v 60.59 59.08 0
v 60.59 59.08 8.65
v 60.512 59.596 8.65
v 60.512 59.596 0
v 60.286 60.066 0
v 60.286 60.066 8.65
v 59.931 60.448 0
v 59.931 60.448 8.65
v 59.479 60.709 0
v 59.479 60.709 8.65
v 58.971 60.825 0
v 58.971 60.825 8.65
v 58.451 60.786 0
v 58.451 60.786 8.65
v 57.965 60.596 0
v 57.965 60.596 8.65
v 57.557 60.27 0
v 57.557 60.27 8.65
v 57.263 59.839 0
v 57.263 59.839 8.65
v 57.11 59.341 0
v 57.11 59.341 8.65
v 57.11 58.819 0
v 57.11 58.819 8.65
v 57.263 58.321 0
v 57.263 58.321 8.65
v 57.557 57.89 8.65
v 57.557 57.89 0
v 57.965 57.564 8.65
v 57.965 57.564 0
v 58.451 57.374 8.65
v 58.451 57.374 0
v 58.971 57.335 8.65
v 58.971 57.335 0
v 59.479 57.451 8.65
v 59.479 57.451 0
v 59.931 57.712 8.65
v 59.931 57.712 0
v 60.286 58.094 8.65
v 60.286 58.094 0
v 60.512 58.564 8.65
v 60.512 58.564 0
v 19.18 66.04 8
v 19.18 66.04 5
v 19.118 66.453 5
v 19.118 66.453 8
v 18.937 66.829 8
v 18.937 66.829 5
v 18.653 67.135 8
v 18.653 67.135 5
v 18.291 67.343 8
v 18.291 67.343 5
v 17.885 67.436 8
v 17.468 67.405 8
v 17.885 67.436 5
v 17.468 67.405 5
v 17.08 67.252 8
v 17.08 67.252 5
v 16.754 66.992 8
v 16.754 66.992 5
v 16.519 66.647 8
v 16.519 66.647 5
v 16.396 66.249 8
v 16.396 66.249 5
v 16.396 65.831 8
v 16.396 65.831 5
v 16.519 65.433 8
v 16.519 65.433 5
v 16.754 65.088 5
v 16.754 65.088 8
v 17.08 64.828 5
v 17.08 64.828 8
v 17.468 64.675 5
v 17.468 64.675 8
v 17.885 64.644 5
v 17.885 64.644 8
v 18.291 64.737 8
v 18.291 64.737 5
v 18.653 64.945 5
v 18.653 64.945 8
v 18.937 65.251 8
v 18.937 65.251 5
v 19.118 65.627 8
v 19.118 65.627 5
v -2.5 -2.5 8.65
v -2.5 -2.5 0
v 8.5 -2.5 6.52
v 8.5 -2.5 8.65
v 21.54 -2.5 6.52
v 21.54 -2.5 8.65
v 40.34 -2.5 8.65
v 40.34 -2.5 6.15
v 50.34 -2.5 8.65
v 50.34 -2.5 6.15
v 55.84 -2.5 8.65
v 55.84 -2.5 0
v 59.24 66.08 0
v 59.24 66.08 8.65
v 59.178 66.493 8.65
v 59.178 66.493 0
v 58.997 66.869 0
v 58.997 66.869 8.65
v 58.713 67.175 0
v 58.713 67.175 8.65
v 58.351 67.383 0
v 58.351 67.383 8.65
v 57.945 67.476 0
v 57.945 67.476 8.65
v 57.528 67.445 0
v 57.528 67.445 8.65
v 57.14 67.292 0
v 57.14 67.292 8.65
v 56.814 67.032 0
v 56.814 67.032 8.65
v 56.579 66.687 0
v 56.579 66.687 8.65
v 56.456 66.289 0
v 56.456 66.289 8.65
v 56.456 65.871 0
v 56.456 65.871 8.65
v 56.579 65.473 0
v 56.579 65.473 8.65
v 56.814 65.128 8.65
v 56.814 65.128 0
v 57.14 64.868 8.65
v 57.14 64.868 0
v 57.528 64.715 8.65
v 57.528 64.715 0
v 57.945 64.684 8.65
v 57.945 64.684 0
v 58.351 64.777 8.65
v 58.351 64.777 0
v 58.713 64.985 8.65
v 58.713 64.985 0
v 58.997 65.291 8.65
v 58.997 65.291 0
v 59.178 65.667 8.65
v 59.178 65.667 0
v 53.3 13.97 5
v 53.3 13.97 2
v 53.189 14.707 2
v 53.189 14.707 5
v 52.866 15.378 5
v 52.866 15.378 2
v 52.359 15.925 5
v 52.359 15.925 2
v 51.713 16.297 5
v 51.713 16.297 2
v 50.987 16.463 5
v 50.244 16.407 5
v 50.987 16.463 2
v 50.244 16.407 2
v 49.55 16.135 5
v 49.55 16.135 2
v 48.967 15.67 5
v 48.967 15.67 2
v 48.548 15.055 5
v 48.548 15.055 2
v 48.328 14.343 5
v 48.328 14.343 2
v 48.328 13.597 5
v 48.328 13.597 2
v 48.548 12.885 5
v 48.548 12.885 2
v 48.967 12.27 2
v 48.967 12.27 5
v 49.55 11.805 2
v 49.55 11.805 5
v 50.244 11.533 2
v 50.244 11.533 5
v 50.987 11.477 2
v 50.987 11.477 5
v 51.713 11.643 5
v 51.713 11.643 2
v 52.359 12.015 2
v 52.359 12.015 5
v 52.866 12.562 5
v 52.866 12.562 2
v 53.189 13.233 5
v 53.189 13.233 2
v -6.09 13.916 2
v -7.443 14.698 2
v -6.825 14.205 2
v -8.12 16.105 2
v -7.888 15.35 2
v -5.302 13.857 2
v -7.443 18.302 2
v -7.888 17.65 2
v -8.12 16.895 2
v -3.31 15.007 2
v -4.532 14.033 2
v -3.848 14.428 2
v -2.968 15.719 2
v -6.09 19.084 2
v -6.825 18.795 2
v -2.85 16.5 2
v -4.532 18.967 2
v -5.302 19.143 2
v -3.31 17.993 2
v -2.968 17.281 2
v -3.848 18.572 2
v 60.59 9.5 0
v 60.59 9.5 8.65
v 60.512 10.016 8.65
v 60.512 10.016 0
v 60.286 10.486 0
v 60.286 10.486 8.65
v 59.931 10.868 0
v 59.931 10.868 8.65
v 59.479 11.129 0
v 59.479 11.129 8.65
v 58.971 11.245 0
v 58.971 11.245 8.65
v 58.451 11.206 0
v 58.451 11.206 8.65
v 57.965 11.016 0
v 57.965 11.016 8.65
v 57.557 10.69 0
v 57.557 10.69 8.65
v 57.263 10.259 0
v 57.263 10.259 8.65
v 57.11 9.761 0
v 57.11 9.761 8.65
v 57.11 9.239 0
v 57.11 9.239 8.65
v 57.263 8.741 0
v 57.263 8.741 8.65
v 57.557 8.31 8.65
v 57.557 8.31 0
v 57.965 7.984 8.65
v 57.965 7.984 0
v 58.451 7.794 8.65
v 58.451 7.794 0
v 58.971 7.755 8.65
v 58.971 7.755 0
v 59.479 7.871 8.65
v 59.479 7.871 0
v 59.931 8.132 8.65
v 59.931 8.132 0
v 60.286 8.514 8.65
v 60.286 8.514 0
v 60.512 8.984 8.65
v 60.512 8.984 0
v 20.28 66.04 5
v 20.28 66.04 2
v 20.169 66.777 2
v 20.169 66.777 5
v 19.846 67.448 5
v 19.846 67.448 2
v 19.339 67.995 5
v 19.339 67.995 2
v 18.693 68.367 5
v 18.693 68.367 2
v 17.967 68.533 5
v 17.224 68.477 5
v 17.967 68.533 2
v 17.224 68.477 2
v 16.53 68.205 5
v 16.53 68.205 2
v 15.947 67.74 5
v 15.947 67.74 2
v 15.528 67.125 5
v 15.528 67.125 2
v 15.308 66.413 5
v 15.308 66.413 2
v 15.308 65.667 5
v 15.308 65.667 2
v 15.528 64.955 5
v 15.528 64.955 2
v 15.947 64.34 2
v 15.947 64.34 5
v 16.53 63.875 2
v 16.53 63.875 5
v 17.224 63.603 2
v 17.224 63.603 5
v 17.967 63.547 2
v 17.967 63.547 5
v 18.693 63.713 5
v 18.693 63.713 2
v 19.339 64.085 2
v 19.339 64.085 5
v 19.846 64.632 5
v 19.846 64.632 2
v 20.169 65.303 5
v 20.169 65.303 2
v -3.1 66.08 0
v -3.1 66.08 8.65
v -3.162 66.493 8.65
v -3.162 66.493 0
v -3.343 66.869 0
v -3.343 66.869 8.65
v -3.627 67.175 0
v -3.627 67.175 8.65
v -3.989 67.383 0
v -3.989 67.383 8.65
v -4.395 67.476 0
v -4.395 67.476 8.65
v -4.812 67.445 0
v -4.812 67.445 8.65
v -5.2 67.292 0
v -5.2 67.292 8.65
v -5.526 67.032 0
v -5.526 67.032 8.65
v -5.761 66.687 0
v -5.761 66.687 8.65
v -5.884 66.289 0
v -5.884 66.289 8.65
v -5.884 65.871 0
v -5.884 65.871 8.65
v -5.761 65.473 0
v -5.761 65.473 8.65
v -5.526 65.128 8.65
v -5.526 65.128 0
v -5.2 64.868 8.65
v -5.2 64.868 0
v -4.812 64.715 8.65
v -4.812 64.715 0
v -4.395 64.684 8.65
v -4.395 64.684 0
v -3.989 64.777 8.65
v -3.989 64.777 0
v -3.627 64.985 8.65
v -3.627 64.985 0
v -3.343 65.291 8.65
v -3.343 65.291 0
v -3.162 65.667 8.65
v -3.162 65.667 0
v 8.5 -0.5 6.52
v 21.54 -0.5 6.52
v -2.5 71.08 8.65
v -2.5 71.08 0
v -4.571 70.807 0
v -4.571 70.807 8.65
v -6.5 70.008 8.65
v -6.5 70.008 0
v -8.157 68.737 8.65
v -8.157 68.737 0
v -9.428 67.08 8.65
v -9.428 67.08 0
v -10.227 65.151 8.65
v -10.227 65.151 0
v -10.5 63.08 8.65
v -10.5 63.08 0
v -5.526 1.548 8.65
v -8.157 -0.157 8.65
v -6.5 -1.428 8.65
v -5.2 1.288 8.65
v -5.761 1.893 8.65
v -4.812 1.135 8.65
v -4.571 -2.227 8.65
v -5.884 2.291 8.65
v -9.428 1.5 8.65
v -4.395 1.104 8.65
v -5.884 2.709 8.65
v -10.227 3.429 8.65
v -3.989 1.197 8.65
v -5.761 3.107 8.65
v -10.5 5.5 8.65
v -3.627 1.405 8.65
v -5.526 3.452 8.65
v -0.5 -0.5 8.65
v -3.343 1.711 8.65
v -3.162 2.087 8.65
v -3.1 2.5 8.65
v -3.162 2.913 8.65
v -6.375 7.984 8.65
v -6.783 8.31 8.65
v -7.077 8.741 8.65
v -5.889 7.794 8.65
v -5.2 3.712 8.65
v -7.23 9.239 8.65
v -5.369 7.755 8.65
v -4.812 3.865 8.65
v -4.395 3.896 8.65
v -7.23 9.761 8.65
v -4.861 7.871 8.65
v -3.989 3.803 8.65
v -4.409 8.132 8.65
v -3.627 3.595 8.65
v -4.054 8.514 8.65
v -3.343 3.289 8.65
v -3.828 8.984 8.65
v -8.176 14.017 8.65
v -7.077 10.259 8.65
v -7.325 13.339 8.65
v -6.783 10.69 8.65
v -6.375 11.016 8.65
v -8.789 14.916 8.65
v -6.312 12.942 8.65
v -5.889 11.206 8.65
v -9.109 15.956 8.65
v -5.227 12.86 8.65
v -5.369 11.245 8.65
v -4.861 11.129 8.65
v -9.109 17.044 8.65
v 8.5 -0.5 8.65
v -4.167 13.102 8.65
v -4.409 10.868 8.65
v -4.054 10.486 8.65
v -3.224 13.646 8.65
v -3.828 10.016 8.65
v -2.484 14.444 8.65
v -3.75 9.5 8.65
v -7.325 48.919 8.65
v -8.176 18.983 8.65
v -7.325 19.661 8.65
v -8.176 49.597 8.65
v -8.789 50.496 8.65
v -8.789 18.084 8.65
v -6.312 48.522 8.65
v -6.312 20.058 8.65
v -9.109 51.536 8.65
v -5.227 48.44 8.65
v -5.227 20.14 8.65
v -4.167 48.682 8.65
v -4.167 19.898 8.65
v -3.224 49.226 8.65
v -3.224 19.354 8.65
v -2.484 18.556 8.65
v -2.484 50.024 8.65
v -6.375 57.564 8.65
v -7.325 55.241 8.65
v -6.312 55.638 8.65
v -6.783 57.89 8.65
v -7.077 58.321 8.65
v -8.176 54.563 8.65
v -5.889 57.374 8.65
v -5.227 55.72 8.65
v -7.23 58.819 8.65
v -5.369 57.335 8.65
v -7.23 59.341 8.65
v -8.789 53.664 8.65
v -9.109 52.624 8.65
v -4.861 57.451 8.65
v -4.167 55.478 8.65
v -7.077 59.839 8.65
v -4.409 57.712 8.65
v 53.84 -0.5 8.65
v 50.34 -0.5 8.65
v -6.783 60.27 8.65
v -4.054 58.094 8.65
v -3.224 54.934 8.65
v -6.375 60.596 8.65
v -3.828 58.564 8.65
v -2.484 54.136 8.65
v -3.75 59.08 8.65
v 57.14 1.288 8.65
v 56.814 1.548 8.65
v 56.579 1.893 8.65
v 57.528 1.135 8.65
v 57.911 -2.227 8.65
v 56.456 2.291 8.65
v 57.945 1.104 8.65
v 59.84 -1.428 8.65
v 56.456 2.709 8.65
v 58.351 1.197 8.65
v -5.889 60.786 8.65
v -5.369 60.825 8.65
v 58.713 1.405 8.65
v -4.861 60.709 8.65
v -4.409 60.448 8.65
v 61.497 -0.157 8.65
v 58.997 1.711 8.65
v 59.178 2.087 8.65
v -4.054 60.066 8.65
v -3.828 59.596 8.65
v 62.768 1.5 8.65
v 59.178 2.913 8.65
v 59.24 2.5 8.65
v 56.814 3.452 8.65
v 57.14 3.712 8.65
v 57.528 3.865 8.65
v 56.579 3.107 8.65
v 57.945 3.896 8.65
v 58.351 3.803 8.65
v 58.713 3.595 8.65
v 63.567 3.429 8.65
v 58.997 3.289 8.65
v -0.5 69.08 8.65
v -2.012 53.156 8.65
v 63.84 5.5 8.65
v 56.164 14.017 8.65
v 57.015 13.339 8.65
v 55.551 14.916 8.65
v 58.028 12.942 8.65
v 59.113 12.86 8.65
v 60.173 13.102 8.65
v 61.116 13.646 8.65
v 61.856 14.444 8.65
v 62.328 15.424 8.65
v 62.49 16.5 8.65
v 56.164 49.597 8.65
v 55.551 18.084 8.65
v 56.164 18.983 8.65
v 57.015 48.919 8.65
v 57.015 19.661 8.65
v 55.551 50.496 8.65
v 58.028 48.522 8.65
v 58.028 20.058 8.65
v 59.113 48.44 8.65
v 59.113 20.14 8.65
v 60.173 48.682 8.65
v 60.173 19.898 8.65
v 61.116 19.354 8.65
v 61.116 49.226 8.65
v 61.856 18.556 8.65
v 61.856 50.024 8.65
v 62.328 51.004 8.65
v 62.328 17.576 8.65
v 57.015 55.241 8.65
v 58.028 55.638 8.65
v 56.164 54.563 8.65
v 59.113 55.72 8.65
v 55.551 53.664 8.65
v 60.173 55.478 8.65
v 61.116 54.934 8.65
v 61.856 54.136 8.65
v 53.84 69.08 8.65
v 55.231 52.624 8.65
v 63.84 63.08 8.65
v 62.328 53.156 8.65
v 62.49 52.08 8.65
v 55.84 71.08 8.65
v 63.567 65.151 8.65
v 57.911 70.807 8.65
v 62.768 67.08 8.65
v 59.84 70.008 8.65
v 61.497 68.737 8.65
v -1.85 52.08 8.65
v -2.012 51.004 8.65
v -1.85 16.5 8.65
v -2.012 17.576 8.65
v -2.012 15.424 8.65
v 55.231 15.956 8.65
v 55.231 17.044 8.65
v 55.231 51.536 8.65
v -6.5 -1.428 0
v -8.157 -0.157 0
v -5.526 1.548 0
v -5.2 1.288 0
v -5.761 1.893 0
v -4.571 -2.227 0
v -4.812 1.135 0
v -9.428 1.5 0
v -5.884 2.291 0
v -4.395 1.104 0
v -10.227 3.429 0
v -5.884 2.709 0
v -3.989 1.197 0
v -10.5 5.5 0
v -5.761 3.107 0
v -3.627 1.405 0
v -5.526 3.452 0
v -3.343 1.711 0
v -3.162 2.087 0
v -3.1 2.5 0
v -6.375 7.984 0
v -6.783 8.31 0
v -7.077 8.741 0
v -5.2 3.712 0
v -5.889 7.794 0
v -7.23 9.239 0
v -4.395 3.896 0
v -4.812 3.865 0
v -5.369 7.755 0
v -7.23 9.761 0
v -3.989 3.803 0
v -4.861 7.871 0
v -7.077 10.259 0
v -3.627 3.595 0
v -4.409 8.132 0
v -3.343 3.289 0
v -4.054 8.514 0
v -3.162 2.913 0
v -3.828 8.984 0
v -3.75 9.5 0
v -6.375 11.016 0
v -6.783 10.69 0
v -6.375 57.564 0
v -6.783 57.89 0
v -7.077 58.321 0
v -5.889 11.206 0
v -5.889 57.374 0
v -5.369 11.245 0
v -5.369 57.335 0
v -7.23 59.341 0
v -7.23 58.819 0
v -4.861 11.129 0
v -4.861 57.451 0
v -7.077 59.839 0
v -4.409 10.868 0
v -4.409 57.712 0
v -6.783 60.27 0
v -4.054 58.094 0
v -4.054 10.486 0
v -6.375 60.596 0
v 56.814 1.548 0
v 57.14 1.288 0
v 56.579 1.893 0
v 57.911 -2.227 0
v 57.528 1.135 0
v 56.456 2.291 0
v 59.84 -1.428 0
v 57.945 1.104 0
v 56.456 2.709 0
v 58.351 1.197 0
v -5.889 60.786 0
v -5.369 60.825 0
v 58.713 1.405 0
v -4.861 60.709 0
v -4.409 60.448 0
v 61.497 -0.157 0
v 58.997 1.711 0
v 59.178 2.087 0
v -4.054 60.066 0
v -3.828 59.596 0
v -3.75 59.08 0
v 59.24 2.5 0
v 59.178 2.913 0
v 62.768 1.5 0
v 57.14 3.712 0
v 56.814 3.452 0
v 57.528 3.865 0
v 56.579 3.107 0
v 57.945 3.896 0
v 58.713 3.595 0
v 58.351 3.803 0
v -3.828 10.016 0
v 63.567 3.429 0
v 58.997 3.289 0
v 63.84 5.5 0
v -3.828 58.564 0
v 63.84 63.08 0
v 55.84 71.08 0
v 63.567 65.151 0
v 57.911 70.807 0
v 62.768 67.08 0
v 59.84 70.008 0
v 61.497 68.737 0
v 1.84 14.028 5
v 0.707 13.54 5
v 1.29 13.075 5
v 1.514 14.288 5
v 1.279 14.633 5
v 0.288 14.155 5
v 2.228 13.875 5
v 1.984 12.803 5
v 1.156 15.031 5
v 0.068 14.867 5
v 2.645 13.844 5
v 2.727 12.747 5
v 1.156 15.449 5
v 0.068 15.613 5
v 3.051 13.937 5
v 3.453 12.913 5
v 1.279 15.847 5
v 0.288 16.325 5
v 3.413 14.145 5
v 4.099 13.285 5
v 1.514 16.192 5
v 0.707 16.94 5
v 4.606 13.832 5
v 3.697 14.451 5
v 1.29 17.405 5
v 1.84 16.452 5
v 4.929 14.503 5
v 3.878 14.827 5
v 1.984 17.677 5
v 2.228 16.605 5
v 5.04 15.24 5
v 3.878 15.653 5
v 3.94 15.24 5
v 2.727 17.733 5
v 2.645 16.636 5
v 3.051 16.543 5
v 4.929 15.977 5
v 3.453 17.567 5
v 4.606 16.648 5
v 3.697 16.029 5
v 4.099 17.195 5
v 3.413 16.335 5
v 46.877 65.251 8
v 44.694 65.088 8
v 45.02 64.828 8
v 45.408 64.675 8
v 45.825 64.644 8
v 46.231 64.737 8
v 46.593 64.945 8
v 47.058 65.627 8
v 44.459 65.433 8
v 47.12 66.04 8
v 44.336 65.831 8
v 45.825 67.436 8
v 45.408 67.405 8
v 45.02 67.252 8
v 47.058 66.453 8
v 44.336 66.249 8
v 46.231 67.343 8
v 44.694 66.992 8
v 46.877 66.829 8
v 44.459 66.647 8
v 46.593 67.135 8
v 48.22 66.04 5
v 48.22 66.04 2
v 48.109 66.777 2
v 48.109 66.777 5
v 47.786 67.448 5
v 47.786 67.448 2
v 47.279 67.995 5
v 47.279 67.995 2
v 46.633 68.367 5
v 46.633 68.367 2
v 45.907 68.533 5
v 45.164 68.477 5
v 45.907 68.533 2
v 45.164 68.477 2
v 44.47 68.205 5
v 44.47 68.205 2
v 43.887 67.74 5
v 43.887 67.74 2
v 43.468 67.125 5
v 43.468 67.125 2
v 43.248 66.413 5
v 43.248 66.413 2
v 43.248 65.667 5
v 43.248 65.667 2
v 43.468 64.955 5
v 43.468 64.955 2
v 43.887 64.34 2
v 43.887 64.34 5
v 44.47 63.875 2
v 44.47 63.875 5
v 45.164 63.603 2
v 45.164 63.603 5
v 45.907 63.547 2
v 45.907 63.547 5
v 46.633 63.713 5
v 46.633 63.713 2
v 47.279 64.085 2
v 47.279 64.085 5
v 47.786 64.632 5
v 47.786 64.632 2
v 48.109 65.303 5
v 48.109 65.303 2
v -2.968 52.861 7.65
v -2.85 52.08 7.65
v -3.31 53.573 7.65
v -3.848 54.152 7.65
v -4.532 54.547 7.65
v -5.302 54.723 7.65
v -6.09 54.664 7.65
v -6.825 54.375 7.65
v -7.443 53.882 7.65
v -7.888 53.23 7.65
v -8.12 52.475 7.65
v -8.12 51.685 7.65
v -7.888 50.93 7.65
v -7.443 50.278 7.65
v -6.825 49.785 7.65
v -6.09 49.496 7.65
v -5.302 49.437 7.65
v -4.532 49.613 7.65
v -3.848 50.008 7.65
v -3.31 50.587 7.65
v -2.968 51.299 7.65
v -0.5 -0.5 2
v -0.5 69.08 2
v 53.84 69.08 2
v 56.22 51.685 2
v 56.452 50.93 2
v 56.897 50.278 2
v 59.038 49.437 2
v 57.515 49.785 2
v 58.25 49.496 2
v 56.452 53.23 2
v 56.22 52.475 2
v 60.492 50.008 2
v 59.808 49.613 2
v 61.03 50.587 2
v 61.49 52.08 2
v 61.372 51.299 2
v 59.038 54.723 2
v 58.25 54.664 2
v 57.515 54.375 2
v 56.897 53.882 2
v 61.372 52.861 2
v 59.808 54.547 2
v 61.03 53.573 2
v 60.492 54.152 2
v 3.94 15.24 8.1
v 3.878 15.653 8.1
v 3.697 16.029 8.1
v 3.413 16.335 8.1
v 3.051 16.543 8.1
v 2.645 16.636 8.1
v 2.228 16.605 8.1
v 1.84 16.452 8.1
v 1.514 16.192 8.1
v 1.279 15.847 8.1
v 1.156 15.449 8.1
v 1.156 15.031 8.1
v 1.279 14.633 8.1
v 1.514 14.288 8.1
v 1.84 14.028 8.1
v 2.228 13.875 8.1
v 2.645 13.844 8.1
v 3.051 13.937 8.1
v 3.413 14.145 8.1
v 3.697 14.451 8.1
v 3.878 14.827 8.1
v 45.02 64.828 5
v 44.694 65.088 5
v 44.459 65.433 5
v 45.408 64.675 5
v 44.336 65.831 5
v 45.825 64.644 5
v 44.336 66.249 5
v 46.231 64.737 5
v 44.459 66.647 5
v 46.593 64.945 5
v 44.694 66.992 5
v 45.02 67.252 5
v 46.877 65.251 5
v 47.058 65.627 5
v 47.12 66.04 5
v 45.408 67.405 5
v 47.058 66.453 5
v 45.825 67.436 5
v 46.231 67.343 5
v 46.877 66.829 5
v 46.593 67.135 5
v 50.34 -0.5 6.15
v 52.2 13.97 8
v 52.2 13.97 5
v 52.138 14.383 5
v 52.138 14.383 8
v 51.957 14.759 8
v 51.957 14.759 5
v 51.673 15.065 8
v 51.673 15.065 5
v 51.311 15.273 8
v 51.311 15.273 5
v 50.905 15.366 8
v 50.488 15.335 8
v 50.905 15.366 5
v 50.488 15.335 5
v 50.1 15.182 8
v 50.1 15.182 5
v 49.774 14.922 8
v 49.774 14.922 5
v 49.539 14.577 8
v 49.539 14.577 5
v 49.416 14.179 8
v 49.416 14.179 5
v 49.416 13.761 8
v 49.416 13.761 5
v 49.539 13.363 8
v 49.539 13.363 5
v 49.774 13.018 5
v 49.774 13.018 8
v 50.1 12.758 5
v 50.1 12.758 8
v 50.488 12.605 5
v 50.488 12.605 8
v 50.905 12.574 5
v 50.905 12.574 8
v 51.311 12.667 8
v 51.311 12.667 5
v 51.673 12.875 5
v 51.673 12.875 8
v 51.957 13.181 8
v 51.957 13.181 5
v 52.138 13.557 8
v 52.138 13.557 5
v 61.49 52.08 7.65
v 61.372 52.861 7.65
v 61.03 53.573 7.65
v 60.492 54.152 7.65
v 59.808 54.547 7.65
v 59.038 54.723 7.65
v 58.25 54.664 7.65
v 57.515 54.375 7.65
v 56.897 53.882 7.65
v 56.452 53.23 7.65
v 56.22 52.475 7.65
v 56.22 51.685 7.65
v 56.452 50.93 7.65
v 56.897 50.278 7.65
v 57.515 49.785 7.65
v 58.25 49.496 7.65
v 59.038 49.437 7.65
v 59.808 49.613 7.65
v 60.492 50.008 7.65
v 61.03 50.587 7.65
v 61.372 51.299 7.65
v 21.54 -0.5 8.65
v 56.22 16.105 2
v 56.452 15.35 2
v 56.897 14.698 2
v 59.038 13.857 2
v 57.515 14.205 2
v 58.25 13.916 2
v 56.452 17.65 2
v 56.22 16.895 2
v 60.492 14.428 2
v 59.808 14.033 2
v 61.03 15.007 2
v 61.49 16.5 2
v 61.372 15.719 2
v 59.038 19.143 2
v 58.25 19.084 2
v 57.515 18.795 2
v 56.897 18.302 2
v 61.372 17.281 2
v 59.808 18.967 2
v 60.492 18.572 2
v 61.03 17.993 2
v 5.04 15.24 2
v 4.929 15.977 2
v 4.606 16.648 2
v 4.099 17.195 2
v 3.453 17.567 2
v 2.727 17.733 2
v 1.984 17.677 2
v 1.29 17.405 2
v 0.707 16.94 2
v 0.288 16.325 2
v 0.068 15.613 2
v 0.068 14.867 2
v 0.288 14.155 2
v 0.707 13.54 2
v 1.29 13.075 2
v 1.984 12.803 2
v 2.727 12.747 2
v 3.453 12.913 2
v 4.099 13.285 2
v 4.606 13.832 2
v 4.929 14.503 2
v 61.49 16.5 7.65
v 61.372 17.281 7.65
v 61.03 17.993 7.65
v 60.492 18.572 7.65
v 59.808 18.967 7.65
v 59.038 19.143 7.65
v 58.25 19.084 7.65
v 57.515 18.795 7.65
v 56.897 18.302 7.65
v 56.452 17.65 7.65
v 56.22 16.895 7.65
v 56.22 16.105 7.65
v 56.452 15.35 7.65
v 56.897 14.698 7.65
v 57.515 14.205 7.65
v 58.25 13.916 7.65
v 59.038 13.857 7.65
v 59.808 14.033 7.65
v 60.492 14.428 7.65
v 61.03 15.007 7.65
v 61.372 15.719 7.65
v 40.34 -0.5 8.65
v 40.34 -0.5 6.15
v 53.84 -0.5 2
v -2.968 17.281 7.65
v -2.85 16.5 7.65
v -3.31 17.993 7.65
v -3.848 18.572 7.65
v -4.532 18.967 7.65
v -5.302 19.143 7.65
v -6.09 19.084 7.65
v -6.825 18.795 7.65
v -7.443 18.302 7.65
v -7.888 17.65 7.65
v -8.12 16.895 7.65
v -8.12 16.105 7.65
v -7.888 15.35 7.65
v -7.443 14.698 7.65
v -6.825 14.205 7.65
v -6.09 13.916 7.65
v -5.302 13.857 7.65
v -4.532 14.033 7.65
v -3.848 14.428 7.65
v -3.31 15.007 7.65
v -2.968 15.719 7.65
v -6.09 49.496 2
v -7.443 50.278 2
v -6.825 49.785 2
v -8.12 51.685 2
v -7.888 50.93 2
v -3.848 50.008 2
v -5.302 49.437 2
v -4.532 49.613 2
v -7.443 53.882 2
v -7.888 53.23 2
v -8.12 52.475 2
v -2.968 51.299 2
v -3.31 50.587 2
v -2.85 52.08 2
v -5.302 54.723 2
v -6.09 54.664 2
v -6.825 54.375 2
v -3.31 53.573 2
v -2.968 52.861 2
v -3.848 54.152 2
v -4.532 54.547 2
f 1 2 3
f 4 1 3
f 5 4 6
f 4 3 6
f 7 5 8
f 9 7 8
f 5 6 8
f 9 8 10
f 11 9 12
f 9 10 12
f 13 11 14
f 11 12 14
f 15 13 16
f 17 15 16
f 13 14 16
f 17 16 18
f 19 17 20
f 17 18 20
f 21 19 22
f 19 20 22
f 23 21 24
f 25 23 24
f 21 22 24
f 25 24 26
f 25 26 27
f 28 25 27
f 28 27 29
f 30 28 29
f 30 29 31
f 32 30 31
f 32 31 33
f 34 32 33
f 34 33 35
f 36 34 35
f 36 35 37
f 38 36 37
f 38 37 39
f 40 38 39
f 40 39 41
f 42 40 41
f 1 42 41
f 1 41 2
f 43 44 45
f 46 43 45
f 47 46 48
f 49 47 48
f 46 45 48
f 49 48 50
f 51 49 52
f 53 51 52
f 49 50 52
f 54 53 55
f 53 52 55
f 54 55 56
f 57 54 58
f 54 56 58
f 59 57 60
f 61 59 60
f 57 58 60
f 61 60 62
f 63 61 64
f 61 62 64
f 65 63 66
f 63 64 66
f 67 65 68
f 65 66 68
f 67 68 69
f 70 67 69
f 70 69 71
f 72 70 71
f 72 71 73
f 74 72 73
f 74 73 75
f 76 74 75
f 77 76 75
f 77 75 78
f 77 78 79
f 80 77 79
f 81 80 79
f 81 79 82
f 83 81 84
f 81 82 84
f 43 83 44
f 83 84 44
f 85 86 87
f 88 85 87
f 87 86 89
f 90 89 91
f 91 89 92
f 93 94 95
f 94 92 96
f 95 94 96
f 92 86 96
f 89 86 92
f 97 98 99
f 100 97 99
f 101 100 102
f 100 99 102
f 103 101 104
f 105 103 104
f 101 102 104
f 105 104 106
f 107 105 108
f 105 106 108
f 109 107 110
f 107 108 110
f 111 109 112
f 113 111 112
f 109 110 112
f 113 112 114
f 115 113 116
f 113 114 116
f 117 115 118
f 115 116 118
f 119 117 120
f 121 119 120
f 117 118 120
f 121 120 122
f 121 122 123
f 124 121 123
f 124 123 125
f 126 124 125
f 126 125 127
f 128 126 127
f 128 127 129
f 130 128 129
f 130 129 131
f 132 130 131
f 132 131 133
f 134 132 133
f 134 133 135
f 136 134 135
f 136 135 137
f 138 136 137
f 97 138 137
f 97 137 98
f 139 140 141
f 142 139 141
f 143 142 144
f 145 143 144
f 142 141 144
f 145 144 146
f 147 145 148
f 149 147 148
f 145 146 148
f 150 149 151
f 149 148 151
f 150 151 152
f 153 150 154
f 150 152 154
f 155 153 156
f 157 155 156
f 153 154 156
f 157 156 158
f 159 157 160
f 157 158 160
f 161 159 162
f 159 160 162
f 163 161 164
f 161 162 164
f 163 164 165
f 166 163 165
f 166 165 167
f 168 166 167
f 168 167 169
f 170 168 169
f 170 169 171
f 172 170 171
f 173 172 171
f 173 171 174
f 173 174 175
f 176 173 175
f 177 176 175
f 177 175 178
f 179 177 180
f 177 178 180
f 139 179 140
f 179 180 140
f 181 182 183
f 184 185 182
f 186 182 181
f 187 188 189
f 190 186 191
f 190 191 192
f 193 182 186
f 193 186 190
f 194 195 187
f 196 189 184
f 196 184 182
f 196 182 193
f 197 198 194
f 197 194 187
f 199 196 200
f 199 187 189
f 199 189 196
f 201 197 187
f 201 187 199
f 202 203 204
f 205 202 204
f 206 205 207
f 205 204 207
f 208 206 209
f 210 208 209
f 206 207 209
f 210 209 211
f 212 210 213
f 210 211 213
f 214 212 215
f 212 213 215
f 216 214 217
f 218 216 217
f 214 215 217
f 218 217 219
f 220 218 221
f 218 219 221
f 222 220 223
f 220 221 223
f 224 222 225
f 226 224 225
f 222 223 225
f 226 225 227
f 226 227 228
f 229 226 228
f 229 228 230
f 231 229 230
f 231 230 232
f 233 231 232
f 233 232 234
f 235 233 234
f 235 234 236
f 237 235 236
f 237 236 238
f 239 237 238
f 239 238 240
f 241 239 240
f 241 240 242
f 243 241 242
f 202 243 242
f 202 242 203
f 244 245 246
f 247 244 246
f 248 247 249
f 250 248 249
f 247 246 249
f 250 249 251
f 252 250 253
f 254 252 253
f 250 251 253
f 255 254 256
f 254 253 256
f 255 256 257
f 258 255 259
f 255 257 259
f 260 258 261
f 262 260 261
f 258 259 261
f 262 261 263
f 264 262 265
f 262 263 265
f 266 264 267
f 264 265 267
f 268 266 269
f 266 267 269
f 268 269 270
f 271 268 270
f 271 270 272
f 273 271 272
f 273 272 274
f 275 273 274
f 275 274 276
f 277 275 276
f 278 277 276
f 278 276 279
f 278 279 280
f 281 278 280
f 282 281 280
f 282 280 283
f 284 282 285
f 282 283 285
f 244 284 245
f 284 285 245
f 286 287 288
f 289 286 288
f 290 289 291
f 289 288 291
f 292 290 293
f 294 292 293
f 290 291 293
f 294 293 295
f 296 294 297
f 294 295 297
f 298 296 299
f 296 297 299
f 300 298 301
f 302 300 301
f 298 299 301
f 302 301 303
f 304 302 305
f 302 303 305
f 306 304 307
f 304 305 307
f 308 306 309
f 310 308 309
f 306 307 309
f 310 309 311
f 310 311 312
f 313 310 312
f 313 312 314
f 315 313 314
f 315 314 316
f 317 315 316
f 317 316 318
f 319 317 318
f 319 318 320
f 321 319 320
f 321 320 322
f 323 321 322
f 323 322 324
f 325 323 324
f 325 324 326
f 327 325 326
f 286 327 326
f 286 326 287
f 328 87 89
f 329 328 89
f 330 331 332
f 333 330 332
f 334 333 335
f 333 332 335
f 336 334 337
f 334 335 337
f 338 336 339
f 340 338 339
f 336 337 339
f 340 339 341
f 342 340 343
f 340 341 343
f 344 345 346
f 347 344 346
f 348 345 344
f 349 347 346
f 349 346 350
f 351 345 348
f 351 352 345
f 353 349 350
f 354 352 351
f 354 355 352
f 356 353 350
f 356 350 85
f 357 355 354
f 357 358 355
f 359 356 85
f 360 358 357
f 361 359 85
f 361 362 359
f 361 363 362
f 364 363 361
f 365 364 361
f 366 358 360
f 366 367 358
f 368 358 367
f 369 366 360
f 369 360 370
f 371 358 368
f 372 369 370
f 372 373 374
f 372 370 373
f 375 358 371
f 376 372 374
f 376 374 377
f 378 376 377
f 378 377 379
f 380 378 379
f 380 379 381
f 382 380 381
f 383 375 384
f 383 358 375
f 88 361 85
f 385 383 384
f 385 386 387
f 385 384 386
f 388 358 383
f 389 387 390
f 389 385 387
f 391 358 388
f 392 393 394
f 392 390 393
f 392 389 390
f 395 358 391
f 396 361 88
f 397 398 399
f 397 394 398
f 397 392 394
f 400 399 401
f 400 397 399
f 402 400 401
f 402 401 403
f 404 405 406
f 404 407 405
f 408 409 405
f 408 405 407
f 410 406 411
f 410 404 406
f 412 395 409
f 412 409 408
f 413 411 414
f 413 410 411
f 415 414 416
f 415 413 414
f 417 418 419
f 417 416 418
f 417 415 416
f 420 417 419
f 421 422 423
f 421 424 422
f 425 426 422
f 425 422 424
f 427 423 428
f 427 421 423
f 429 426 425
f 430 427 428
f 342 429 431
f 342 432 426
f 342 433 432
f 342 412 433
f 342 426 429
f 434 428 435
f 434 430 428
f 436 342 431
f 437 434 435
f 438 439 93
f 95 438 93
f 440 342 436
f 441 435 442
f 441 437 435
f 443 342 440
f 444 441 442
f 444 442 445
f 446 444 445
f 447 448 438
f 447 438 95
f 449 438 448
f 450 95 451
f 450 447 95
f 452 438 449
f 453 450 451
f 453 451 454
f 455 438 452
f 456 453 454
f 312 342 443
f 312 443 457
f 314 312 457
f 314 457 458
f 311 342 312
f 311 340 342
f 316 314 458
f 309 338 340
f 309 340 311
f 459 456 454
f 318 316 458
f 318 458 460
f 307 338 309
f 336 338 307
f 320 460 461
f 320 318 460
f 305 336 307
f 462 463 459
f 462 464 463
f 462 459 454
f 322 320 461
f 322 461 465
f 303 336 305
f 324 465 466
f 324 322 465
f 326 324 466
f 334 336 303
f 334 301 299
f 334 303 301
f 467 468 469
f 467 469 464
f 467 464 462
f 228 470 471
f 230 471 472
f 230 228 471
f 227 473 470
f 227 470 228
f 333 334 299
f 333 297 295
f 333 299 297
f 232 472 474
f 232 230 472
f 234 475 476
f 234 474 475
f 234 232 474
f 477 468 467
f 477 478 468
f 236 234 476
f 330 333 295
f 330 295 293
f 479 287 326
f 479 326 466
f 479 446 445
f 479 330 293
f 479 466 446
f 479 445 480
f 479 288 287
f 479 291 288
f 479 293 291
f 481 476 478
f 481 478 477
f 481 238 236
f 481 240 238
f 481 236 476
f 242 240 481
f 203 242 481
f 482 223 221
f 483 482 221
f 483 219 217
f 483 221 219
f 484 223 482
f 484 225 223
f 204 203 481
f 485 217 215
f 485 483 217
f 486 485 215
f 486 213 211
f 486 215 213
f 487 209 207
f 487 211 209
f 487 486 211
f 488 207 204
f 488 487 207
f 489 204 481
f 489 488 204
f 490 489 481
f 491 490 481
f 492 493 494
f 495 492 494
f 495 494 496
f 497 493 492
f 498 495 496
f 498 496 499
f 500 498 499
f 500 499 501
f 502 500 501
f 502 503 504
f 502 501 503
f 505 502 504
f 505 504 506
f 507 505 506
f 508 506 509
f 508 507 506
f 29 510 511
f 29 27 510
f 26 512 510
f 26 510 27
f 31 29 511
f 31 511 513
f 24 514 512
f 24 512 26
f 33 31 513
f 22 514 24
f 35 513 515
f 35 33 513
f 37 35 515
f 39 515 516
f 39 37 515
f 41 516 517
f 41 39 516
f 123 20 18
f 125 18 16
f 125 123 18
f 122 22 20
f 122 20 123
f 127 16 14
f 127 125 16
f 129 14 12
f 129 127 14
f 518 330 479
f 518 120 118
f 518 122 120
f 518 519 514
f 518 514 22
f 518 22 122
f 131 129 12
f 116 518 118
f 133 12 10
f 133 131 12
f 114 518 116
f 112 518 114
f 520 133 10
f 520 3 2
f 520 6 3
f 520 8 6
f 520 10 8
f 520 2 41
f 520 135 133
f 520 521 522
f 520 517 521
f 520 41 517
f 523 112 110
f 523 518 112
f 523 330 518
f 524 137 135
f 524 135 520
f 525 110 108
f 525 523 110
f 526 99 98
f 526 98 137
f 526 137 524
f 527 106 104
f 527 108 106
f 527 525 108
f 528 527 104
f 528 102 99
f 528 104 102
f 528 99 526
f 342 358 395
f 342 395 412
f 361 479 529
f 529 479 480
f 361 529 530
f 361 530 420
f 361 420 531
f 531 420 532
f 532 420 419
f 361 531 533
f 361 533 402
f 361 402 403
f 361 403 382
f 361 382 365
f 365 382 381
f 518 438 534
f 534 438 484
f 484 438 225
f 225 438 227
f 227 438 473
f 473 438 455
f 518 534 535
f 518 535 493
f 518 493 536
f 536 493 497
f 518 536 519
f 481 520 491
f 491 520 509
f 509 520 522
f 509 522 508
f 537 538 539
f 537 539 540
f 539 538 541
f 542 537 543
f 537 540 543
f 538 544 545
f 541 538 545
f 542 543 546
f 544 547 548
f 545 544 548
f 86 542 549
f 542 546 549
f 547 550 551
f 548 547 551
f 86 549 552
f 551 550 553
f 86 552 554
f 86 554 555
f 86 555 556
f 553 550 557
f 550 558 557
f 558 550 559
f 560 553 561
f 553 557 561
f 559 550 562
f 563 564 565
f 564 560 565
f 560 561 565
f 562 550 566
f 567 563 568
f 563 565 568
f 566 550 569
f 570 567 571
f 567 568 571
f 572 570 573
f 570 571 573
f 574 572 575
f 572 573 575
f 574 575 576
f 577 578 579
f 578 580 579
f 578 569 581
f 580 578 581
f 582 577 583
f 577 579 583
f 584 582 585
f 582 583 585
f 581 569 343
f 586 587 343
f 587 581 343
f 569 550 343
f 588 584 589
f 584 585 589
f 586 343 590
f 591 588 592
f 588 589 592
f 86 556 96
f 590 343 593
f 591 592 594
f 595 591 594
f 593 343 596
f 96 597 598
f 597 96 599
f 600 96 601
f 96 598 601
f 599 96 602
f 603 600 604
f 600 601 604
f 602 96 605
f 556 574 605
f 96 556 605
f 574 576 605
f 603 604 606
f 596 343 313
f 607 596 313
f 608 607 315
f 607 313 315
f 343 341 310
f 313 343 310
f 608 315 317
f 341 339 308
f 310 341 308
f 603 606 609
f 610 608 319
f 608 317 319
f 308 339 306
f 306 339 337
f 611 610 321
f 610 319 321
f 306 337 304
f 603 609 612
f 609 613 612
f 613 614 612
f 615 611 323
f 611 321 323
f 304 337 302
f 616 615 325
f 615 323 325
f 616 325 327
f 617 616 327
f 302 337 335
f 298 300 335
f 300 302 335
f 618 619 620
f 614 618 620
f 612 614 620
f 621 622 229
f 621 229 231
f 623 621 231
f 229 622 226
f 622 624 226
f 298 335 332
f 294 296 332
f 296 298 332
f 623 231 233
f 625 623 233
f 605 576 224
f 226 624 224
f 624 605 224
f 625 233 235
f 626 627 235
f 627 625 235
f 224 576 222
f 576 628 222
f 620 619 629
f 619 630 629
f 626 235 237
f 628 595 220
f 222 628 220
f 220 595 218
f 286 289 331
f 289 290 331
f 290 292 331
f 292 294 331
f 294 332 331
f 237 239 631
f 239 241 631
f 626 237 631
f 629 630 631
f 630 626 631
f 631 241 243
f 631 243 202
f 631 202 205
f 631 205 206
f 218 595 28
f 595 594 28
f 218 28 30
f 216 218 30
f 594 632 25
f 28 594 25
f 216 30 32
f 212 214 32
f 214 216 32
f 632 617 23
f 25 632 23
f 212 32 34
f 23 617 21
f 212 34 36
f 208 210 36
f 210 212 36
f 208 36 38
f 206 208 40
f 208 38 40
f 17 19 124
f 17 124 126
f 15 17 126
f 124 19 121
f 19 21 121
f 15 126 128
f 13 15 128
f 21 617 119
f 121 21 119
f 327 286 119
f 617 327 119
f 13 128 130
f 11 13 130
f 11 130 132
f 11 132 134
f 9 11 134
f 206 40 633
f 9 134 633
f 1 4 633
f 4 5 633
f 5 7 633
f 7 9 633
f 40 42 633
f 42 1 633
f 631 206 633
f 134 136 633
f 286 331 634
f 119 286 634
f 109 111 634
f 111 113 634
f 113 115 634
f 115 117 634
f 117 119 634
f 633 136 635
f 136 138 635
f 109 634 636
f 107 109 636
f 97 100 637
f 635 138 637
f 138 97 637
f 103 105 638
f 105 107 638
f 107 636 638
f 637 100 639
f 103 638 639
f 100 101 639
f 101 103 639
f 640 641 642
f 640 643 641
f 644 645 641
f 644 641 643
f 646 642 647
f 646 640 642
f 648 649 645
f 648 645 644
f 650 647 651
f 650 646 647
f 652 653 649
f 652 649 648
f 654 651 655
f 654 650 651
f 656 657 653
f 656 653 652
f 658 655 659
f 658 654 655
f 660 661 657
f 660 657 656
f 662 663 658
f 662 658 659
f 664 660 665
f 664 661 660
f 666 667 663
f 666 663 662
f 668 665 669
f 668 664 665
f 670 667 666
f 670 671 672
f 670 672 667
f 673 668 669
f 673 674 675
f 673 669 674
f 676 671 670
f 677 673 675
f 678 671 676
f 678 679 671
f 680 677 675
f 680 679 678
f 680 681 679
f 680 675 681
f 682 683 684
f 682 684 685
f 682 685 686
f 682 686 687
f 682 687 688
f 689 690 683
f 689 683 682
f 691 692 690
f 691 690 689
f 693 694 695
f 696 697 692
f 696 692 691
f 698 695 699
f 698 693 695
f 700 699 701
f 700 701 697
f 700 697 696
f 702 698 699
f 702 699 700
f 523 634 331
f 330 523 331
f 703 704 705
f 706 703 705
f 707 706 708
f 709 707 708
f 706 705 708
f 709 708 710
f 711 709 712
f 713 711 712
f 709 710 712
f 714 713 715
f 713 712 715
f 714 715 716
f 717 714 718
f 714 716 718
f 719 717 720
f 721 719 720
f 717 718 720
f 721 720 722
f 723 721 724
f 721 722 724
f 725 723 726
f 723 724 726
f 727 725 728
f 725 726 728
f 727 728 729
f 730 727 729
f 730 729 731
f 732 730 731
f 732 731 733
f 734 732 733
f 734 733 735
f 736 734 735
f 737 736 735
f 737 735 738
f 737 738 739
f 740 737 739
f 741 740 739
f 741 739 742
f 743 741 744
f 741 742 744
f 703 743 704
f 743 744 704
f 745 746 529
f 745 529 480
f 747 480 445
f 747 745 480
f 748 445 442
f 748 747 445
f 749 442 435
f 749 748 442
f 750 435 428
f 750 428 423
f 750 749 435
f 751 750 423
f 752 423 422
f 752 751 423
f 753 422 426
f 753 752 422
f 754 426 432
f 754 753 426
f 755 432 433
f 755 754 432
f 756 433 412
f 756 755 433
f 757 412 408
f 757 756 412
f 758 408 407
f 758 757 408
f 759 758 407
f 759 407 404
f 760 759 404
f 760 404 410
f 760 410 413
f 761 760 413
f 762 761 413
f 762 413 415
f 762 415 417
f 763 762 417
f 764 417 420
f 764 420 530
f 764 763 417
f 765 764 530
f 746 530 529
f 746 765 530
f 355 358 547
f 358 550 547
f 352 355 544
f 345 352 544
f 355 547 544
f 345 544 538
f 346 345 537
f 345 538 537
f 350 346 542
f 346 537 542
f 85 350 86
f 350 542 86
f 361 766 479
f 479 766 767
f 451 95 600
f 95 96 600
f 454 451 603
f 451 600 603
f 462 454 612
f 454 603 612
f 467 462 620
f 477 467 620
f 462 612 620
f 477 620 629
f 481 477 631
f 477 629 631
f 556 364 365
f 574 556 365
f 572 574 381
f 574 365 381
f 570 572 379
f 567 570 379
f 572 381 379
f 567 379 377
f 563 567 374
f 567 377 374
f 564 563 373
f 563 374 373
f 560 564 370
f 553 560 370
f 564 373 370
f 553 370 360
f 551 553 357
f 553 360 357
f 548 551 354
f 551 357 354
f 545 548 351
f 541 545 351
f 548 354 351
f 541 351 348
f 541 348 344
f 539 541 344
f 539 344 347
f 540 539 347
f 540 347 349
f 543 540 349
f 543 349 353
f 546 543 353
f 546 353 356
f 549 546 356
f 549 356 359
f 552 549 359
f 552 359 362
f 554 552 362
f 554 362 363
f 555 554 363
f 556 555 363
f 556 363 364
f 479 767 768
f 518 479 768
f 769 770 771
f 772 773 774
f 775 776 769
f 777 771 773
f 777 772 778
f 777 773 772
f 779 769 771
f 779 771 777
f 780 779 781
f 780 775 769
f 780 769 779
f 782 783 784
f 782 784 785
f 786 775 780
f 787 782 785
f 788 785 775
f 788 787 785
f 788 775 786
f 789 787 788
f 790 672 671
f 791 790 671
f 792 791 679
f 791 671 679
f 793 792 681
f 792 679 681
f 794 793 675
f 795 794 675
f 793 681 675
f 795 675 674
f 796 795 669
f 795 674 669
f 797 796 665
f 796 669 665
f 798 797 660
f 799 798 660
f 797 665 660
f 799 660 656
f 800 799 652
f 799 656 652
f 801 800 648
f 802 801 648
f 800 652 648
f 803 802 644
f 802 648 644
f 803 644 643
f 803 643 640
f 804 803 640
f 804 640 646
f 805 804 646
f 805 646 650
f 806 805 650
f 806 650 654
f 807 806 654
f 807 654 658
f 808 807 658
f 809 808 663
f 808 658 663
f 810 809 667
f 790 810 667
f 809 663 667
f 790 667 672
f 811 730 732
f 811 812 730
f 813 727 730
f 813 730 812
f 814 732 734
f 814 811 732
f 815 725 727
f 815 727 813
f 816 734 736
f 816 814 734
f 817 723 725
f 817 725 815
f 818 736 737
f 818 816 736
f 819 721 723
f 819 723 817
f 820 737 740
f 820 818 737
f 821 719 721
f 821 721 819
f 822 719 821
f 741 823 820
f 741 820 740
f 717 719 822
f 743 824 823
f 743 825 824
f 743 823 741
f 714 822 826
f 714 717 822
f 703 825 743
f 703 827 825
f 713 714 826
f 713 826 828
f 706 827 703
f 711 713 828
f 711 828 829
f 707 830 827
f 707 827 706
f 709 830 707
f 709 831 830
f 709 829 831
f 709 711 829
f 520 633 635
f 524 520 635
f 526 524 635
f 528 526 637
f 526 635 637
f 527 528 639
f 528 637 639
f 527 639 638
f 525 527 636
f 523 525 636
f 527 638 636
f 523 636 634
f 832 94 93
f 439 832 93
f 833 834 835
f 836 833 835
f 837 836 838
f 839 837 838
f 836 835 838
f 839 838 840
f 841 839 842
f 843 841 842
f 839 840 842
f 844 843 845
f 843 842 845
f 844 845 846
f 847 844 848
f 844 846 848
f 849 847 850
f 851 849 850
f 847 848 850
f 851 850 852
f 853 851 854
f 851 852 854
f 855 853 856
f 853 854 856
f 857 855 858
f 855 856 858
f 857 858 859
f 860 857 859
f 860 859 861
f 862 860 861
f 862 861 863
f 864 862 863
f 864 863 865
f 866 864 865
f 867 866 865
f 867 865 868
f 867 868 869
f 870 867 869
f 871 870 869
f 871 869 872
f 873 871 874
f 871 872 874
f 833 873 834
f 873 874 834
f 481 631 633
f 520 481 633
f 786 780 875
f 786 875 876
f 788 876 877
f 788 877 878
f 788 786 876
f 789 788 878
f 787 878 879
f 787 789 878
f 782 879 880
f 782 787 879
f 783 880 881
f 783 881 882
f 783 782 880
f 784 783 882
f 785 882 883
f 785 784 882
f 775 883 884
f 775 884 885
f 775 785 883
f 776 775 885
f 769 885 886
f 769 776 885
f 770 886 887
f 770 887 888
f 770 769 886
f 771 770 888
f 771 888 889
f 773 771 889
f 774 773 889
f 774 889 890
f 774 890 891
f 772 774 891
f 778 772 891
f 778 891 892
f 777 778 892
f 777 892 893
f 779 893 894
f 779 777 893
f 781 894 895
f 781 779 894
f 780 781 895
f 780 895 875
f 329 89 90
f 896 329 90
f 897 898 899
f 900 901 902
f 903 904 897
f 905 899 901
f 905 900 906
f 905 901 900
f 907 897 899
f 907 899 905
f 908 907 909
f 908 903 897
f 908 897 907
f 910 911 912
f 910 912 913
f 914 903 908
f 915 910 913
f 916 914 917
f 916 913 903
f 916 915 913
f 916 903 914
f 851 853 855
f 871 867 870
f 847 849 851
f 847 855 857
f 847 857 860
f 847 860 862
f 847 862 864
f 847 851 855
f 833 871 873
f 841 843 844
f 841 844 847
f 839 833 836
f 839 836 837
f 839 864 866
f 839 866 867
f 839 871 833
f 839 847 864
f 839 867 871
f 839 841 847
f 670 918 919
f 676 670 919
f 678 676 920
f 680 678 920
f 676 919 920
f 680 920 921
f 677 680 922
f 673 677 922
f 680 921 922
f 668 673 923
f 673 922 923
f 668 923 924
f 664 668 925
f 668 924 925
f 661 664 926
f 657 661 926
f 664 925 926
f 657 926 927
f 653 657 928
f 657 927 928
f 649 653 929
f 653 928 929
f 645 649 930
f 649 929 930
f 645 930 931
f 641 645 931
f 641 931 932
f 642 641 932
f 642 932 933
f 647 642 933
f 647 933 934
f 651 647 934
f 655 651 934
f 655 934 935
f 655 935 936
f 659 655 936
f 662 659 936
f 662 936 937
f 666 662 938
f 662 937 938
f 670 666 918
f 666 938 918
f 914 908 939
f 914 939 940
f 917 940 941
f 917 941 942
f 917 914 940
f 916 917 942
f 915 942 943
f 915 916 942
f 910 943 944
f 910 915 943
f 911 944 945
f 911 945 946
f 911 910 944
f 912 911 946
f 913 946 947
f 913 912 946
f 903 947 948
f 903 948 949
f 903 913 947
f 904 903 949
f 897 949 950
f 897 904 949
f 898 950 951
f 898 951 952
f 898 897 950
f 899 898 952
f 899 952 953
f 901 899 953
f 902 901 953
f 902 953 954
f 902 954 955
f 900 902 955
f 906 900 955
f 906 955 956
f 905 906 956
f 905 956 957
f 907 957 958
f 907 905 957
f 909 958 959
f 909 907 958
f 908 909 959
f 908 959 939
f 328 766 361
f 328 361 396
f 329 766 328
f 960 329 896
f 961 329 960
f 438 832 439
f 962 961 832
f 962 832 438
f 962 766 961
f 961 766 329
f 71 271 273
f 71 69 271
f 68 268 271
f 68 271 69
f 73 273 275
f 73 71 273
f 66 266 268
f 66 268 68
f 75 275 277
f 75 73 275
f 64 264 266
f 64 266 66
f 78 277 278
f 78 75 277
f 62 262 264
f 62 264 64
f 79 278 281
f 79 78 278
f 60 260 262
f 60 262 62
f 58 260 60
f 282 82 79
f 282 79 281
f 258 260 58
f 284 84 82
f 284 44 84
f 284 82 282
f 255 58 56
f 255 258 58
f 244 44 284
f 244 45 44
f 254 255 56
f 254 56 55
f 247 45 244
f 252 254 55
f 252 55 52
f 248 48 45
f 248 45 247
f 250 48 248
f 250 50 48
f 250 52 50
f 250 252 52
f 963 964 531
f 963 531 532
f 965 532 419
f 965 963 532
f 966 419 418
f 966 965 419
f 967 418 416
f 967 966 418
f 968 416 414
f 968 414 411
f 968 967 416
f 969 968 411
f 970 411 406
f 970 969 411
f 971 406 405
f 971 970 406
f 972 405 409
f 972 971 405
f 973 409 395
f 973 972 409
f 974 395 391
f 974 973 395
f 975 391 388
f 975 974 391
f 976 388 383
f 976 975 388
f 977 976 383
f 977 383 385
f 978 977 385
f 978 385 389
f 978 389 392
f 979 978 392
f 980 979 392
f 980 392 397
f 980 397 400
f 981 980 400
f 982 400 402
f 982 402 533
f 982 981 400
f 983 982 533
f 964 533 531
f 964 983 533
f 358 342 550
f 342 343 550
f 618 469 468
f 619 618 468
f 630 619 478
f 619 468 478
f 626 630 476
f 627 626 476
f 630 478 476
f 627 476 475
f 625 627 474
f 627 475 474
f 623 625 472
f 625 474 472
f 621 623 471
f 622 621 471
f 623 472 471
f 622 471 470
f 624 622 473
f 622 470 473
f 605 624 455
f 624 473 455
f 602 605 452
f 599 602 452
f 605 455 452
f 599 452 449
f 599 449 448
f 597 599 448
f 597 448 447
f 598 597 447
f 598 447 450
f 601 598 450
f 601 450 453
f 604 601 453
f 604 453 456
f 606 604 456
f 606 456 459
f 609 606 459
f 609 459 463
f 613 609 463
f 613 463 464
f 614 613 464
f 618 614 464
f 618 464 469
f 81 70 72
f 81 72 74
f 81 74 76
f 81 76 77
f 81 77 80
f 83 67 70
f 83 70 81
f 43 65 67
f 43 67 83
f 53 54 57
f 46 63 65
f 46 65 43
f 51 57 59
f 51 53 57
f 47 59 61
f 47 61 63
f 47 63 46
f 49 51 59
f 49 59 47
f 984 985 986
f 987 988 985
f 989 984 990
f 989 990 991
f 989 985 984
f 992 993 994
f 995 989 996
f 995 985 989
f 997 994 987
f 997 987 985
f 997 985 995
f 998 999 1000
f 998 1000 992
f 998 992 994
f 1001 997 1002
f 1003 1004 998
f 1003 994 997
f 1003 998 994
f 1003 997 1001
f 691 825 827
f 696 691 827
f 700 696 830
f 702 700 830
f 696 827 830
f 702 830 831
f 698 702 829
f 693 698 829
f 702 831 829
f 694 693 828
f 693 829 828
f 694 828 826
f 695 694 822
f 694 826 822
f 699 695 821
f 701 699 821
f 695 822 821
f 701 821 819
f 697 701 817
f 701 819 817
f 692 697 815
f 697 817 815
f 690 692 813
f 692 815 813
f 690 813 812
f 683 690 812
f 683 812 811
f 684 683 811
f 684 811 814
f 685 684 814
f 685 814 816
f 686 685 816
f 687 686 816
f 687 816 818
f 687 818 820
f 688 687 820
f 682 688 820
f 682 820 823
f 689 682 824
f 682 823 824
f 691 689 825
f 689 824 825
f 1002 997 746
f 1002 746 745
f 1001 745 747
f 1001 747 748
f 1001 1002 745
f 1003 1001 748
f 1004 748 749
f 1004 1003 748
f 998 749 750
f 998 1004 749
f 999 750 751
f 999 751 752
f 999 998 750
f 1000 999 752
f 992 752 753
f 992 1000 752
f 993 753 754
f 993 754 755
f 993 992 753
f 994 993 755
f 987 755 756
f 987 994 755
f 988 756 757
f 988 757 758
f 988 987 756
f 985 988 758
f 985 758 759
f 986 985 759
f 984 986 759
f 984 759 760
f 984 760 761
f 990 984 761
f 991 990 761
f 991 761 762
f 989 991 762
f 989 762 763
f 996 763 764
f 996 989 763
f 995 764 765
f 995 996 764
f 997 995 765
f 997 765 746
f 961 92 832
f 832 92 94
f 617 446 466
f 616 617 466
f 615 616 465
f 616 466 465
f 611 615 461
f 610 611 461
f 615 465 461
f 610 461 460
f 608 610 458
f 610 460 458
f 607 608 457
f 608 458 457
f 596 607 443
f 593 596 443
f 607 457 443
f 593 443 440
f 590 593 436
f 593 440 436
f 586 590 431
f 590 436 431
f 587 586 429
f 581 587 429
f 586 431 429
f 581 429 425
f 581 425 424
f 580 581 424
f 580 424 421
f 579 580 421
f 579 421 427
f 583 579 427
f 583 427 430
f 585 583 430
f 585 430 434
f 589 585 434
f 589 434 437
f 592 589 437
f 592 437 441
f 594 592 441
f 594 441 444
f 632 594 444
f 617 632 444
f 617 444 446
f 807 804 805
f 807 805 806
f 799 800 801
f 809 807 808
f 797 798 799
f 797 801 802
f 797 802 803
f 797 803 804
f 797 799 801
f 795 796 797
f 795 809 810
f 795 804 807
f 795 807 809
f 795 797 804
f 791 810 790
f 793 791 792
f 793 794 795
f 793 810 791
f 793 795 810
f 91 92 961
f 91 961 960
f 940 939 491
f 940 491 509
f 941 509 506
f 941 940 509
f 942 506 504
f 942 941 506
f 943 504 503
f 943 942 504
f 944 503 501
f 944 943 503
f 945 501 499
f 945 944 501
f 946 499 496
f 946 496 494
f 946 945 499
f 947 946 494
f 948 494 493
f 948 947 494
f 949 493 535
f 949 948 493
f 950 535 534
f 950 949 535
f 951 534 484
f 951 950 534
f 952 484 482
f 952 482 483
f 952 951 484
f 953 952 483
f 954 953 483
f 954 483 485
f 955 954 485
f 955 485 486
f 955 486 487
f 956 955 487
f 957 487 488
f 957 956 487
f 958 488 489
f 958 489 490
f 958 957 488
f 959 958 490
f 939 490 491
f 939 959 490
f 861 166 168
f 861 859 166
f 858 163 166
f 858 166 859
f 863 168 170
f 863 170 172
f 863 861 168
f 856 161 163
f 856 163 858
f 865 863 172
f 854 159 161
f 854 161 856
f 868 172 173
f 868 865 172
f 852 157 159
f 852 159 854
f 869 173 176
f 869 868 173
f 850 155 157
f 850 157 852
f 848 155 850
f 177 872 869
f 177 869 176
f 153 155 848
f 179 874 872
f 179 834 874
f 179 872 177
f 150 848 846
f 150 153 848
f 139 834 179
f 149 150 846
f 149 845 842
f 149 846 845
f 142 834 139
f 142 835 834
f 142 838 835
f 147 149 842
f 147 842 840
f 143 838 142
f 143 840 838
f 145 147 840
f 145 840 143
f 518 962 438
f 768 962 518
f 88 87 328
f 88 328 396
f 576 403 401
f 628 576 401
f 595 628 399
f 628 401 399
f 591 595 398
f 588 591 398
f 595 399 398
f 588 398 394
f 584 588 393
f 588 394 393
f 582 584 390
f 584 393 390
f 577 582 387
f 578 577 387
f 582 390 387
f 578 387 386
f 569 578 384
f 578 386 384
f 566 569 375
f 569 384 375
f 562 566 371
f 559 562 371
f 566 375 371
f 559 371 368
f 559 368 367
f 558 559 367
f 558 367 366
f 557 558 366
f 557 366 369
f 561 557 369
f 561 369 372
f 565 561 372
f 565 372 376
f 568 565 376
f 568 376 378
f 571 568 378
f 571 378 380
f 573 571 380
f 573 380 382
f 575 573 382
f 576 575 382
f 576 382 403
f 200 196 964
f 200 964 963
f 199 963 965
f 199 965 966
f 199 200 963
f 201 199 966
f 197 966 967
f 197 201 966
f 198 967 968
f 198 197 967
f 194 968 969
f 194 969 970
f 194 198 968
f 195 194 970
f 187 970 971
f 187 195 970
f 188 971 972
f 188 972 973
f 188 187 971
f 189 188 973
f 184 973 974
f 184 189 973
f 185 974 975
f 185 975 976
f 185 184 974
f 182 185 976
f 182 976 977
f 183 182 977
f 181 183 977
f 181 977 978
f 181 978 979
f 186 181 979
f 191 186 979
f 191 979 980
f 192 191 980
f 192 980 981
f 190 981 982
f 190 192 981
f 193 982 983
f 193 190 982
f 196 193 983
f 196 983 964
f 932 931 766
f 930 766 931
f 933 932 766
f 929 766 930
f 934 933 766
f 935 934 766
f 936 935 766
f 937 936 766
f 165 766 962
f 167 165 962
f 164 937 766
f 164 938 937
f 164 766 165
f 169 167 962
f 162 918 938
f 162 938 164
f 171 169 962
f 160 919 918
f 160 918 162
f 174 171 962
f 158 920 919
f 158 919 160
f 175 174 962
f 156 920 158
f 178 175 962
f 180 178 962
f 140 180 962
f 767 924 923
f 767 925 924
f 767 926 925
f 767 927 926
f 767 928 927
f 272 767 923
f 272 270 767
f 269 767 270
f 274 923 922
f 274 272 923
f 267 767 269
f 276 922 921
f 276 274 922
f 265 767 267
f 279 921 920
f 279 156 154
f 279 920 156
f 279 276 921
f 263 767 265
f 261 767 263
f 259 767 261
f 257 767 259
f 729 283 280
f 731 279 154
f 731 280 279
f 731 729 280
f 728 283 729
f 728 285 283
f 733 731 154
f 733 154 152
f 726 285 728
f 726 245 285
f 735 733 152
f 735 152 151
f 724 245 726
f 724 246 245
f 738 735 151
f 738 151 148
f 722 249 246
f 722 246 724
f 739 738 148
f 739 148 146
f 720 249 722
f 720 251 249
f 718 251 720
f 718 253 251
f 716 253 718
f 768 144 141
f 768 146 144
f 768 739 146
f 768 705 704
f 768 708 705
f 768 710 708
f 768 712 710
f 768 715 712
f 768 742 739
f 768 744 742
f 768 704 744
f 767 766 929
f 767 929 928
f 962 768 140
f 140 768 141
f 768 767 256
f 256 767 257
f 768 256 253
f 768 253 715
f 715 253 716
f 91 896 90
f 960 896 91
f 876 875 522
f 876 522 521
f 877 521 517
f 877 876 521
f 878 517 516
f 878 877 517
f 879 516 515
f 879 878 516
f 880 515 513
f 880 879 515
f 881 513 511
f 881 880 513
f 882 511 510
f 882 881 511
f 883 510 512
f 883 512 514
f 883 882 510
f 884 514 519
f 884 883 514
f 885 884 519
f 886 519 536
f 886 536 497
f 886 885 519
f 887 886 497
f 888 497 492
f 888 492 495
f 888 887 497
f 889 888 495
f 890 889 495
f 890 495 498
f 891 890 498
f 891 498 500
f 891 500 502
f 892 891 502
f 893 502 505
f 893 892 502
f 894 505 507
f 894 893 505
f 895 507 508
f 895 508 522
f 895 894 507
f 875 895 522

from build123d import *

# Parameters (mm, degrees)
F1_DEPTH  = 2
F2_R      = 2.5
F3_DEPTH  = 3
F4_R      = 1.4
F5_DEPTH  = 3
F6_R      = 1.4
F7_DEPTH  = 3
F8_R      = 1.4
F9_DEPTH  = 3.1
F10_R     = 1.4
F11_DEPTH = 3
F12_R     = 2.65
F12_W     = 54.34
F12_H     = 69.58
F13_DEPTH = 6.65
F14_R     = 1.75
F14_R_2   = 1.4
F15_DEPTH = 25
F16_W     = 13.04
F16_H     = 2.13
F16_W_2   = 10
F16_H_2   = 2.5
F17_DEPTH = 3
F18_SIZE  = 1


with BuildPart() as f1:
    # F0 (on Top) → F1 (new body)
    with BuildSketch(Plane.XY):
        with BuildLine():
            Line((55.84, 71.08), (-2.5, 71.08))
            ThreePointArc((-2.5, 71.08), (-8.156854, 68.736854), (-10.5, 63.08))
            Line((-10.5, 63.08), (-10.5, 5.5))
            ThreePointArc((-10.5, 5.5), (-8.156854, -0.156854), (-2.5, -2.5))
            Line((-2.5, -2.5), (55.84, -2.5))
            ThreePointArc((55.84, -2.5), (61.496854, -0.156854), (63.84, 5.5))
            Line((63.84, 5.5), (63.84, 63.08))
            ThreePointArc((63.84, 63.08), (61.496854, 68.736854), (55.84, 71.08))
        make_face()
    extrude(amount=F1_DEPTH)

    # F2 (on face) → F3 (join)
    with BuildSketch(Plane.XY.offset(2)):
        with Locations((17.78, 66.04)):
            Circle(F2_R)
        with Locations((45.72, 66.04)):
            Circle(F2_R)
        with Locations((2.54, 15.24)):
            Circle(F2_R)
        with Locations((50.8, 13.97)):
            Circle(F2_R)
    extrude(amount=F3_DEPTH)

    # F4 (on face) → F5 (join)
    with BuildSketch(Plane.XY.offset(5)):
        with Locations((17.78, 66.04)):
            Circle(F4_R)
    extrude(amount=F5_DEPTH)

    # F6 (on face) → F7 (join)
    with BuildSketch(Plane.XY.offset(5)):
        with Locations((45.72, 66.04)):
            Circle(F6_R)
    extrude(amount=F7_DEPTH)

    # F8 (on face) → F9 (join)
    with BuildSketch(Plane.XY.offset(5)):
        with Locations((2.54, 15.24)):
            Circle(F8_R)
    extrude(amount=F9_DEPTH)

    # F10 (on face) → F11 (join)
    with BuildSketch(Plane.XY.offset(5)):
        with Locations((50.8, 13.97)):
            Circle(F10_R)
    extrude(amount=F11_DEPTH)

    # F12 (on face) → F13 (join)
    with BuildSketch(Plane.XY.offset(2)):
        with BuildLine():
            ThreePointArc((-2.5, 71.08), (-8.156854, 68.736854), (-10.5, 63.08))
            Line((-10.5, 63.08), (-10.5, 5.5))
            ThreePointArc((-10.5, 5.5), (-8.156854, -0.156854), (-2.5, -2.5))
            Line((-2.5, -2.5), (55.84, -2.5))
            ThreePointArc((55.84, -2.5), (61.496854, -0.156854), (63.84, 5.5))
            Line((63.84, 5.5), (63.84, 63.08))
            ThreePointArc((63.84, 63.08), (61.496854, 68.736854), (55.84, 71.08))
            Line((55.84, 71.08), (-2.5, 71.08))
        make_face()
        with Locations((-5.5, 16.5)):
            Circle(F12_R, mode=Mode.SUBTRACT)
        with Locations((58.84, 16.5)):
            Circle(F12_R, mode=Mode.SUBTRACT)
        with Locations((-5.5, 52.08)):
            Circle(F12_R, mode=Mode.SUBTRACT)
        with Locations((26.67, 34.29)):
            Rectangle(F12_W, F12_H, mode=Mode.SUBTRACT)
        with Locations((58.84, 52.08)):
            Circle(F12_R, mode=Mode.SUBTRACT)
    extrude(amount=F13_DEPTH)

    # F14 (on face) → F15 (cut)
    with BuildSketch(Plane.XY.offset(8.65)):
        with Locations((-5.5, 9.5)):
            Circle(F14_R)
        with Locations((-4.5, 2.5)):
            Circle(F14_R_2)
        with Locations((-4.5, 66.08)):
            Circle(F14_R_2)
        with Locations((-5.5, 59.08)):
            Circle(F14_R)
        with Locations((57.84, 66.08)):
            Circle(F14_R_2)
        with Locations((58.84, 59.08)):
            Circle(F14_R)
        with Locations((58.84, 9.5)):
            Circle(F14_R)
        with Locations((57.84, 2.5)):
            Circle(F14_R_2)
    extrude(amount=-F15_DEPTH, mode=Mode.SUBTRACT)

    # F16 (on face) → F17 (cut)
    with BuildSketch(Plane.XZ.offset(2.5)):
        with Locations((15.02, 7.585)):
            Rectangle(F16_W, F16_H)
        with Locations((45.34, 7.4)):
            Rectangle(F16_W_2, F16_H_2)
    extrude(amount=-F17_DEPTH, mode=Mode.SUBTRACT)

    # F18
    f18_edges = [f1.edges().sort_by_distance(p)[0] for p in [
        (56.19, 16.5, 8.65),
        (56.19, 52.08, 8.65),
        (-8.15, 52.08, 8.65),
        (-8.15, 16.5, 8.65),
    ]]
    chamfer(f18_edges, length=F18_SIZE)


solid = f1.part
